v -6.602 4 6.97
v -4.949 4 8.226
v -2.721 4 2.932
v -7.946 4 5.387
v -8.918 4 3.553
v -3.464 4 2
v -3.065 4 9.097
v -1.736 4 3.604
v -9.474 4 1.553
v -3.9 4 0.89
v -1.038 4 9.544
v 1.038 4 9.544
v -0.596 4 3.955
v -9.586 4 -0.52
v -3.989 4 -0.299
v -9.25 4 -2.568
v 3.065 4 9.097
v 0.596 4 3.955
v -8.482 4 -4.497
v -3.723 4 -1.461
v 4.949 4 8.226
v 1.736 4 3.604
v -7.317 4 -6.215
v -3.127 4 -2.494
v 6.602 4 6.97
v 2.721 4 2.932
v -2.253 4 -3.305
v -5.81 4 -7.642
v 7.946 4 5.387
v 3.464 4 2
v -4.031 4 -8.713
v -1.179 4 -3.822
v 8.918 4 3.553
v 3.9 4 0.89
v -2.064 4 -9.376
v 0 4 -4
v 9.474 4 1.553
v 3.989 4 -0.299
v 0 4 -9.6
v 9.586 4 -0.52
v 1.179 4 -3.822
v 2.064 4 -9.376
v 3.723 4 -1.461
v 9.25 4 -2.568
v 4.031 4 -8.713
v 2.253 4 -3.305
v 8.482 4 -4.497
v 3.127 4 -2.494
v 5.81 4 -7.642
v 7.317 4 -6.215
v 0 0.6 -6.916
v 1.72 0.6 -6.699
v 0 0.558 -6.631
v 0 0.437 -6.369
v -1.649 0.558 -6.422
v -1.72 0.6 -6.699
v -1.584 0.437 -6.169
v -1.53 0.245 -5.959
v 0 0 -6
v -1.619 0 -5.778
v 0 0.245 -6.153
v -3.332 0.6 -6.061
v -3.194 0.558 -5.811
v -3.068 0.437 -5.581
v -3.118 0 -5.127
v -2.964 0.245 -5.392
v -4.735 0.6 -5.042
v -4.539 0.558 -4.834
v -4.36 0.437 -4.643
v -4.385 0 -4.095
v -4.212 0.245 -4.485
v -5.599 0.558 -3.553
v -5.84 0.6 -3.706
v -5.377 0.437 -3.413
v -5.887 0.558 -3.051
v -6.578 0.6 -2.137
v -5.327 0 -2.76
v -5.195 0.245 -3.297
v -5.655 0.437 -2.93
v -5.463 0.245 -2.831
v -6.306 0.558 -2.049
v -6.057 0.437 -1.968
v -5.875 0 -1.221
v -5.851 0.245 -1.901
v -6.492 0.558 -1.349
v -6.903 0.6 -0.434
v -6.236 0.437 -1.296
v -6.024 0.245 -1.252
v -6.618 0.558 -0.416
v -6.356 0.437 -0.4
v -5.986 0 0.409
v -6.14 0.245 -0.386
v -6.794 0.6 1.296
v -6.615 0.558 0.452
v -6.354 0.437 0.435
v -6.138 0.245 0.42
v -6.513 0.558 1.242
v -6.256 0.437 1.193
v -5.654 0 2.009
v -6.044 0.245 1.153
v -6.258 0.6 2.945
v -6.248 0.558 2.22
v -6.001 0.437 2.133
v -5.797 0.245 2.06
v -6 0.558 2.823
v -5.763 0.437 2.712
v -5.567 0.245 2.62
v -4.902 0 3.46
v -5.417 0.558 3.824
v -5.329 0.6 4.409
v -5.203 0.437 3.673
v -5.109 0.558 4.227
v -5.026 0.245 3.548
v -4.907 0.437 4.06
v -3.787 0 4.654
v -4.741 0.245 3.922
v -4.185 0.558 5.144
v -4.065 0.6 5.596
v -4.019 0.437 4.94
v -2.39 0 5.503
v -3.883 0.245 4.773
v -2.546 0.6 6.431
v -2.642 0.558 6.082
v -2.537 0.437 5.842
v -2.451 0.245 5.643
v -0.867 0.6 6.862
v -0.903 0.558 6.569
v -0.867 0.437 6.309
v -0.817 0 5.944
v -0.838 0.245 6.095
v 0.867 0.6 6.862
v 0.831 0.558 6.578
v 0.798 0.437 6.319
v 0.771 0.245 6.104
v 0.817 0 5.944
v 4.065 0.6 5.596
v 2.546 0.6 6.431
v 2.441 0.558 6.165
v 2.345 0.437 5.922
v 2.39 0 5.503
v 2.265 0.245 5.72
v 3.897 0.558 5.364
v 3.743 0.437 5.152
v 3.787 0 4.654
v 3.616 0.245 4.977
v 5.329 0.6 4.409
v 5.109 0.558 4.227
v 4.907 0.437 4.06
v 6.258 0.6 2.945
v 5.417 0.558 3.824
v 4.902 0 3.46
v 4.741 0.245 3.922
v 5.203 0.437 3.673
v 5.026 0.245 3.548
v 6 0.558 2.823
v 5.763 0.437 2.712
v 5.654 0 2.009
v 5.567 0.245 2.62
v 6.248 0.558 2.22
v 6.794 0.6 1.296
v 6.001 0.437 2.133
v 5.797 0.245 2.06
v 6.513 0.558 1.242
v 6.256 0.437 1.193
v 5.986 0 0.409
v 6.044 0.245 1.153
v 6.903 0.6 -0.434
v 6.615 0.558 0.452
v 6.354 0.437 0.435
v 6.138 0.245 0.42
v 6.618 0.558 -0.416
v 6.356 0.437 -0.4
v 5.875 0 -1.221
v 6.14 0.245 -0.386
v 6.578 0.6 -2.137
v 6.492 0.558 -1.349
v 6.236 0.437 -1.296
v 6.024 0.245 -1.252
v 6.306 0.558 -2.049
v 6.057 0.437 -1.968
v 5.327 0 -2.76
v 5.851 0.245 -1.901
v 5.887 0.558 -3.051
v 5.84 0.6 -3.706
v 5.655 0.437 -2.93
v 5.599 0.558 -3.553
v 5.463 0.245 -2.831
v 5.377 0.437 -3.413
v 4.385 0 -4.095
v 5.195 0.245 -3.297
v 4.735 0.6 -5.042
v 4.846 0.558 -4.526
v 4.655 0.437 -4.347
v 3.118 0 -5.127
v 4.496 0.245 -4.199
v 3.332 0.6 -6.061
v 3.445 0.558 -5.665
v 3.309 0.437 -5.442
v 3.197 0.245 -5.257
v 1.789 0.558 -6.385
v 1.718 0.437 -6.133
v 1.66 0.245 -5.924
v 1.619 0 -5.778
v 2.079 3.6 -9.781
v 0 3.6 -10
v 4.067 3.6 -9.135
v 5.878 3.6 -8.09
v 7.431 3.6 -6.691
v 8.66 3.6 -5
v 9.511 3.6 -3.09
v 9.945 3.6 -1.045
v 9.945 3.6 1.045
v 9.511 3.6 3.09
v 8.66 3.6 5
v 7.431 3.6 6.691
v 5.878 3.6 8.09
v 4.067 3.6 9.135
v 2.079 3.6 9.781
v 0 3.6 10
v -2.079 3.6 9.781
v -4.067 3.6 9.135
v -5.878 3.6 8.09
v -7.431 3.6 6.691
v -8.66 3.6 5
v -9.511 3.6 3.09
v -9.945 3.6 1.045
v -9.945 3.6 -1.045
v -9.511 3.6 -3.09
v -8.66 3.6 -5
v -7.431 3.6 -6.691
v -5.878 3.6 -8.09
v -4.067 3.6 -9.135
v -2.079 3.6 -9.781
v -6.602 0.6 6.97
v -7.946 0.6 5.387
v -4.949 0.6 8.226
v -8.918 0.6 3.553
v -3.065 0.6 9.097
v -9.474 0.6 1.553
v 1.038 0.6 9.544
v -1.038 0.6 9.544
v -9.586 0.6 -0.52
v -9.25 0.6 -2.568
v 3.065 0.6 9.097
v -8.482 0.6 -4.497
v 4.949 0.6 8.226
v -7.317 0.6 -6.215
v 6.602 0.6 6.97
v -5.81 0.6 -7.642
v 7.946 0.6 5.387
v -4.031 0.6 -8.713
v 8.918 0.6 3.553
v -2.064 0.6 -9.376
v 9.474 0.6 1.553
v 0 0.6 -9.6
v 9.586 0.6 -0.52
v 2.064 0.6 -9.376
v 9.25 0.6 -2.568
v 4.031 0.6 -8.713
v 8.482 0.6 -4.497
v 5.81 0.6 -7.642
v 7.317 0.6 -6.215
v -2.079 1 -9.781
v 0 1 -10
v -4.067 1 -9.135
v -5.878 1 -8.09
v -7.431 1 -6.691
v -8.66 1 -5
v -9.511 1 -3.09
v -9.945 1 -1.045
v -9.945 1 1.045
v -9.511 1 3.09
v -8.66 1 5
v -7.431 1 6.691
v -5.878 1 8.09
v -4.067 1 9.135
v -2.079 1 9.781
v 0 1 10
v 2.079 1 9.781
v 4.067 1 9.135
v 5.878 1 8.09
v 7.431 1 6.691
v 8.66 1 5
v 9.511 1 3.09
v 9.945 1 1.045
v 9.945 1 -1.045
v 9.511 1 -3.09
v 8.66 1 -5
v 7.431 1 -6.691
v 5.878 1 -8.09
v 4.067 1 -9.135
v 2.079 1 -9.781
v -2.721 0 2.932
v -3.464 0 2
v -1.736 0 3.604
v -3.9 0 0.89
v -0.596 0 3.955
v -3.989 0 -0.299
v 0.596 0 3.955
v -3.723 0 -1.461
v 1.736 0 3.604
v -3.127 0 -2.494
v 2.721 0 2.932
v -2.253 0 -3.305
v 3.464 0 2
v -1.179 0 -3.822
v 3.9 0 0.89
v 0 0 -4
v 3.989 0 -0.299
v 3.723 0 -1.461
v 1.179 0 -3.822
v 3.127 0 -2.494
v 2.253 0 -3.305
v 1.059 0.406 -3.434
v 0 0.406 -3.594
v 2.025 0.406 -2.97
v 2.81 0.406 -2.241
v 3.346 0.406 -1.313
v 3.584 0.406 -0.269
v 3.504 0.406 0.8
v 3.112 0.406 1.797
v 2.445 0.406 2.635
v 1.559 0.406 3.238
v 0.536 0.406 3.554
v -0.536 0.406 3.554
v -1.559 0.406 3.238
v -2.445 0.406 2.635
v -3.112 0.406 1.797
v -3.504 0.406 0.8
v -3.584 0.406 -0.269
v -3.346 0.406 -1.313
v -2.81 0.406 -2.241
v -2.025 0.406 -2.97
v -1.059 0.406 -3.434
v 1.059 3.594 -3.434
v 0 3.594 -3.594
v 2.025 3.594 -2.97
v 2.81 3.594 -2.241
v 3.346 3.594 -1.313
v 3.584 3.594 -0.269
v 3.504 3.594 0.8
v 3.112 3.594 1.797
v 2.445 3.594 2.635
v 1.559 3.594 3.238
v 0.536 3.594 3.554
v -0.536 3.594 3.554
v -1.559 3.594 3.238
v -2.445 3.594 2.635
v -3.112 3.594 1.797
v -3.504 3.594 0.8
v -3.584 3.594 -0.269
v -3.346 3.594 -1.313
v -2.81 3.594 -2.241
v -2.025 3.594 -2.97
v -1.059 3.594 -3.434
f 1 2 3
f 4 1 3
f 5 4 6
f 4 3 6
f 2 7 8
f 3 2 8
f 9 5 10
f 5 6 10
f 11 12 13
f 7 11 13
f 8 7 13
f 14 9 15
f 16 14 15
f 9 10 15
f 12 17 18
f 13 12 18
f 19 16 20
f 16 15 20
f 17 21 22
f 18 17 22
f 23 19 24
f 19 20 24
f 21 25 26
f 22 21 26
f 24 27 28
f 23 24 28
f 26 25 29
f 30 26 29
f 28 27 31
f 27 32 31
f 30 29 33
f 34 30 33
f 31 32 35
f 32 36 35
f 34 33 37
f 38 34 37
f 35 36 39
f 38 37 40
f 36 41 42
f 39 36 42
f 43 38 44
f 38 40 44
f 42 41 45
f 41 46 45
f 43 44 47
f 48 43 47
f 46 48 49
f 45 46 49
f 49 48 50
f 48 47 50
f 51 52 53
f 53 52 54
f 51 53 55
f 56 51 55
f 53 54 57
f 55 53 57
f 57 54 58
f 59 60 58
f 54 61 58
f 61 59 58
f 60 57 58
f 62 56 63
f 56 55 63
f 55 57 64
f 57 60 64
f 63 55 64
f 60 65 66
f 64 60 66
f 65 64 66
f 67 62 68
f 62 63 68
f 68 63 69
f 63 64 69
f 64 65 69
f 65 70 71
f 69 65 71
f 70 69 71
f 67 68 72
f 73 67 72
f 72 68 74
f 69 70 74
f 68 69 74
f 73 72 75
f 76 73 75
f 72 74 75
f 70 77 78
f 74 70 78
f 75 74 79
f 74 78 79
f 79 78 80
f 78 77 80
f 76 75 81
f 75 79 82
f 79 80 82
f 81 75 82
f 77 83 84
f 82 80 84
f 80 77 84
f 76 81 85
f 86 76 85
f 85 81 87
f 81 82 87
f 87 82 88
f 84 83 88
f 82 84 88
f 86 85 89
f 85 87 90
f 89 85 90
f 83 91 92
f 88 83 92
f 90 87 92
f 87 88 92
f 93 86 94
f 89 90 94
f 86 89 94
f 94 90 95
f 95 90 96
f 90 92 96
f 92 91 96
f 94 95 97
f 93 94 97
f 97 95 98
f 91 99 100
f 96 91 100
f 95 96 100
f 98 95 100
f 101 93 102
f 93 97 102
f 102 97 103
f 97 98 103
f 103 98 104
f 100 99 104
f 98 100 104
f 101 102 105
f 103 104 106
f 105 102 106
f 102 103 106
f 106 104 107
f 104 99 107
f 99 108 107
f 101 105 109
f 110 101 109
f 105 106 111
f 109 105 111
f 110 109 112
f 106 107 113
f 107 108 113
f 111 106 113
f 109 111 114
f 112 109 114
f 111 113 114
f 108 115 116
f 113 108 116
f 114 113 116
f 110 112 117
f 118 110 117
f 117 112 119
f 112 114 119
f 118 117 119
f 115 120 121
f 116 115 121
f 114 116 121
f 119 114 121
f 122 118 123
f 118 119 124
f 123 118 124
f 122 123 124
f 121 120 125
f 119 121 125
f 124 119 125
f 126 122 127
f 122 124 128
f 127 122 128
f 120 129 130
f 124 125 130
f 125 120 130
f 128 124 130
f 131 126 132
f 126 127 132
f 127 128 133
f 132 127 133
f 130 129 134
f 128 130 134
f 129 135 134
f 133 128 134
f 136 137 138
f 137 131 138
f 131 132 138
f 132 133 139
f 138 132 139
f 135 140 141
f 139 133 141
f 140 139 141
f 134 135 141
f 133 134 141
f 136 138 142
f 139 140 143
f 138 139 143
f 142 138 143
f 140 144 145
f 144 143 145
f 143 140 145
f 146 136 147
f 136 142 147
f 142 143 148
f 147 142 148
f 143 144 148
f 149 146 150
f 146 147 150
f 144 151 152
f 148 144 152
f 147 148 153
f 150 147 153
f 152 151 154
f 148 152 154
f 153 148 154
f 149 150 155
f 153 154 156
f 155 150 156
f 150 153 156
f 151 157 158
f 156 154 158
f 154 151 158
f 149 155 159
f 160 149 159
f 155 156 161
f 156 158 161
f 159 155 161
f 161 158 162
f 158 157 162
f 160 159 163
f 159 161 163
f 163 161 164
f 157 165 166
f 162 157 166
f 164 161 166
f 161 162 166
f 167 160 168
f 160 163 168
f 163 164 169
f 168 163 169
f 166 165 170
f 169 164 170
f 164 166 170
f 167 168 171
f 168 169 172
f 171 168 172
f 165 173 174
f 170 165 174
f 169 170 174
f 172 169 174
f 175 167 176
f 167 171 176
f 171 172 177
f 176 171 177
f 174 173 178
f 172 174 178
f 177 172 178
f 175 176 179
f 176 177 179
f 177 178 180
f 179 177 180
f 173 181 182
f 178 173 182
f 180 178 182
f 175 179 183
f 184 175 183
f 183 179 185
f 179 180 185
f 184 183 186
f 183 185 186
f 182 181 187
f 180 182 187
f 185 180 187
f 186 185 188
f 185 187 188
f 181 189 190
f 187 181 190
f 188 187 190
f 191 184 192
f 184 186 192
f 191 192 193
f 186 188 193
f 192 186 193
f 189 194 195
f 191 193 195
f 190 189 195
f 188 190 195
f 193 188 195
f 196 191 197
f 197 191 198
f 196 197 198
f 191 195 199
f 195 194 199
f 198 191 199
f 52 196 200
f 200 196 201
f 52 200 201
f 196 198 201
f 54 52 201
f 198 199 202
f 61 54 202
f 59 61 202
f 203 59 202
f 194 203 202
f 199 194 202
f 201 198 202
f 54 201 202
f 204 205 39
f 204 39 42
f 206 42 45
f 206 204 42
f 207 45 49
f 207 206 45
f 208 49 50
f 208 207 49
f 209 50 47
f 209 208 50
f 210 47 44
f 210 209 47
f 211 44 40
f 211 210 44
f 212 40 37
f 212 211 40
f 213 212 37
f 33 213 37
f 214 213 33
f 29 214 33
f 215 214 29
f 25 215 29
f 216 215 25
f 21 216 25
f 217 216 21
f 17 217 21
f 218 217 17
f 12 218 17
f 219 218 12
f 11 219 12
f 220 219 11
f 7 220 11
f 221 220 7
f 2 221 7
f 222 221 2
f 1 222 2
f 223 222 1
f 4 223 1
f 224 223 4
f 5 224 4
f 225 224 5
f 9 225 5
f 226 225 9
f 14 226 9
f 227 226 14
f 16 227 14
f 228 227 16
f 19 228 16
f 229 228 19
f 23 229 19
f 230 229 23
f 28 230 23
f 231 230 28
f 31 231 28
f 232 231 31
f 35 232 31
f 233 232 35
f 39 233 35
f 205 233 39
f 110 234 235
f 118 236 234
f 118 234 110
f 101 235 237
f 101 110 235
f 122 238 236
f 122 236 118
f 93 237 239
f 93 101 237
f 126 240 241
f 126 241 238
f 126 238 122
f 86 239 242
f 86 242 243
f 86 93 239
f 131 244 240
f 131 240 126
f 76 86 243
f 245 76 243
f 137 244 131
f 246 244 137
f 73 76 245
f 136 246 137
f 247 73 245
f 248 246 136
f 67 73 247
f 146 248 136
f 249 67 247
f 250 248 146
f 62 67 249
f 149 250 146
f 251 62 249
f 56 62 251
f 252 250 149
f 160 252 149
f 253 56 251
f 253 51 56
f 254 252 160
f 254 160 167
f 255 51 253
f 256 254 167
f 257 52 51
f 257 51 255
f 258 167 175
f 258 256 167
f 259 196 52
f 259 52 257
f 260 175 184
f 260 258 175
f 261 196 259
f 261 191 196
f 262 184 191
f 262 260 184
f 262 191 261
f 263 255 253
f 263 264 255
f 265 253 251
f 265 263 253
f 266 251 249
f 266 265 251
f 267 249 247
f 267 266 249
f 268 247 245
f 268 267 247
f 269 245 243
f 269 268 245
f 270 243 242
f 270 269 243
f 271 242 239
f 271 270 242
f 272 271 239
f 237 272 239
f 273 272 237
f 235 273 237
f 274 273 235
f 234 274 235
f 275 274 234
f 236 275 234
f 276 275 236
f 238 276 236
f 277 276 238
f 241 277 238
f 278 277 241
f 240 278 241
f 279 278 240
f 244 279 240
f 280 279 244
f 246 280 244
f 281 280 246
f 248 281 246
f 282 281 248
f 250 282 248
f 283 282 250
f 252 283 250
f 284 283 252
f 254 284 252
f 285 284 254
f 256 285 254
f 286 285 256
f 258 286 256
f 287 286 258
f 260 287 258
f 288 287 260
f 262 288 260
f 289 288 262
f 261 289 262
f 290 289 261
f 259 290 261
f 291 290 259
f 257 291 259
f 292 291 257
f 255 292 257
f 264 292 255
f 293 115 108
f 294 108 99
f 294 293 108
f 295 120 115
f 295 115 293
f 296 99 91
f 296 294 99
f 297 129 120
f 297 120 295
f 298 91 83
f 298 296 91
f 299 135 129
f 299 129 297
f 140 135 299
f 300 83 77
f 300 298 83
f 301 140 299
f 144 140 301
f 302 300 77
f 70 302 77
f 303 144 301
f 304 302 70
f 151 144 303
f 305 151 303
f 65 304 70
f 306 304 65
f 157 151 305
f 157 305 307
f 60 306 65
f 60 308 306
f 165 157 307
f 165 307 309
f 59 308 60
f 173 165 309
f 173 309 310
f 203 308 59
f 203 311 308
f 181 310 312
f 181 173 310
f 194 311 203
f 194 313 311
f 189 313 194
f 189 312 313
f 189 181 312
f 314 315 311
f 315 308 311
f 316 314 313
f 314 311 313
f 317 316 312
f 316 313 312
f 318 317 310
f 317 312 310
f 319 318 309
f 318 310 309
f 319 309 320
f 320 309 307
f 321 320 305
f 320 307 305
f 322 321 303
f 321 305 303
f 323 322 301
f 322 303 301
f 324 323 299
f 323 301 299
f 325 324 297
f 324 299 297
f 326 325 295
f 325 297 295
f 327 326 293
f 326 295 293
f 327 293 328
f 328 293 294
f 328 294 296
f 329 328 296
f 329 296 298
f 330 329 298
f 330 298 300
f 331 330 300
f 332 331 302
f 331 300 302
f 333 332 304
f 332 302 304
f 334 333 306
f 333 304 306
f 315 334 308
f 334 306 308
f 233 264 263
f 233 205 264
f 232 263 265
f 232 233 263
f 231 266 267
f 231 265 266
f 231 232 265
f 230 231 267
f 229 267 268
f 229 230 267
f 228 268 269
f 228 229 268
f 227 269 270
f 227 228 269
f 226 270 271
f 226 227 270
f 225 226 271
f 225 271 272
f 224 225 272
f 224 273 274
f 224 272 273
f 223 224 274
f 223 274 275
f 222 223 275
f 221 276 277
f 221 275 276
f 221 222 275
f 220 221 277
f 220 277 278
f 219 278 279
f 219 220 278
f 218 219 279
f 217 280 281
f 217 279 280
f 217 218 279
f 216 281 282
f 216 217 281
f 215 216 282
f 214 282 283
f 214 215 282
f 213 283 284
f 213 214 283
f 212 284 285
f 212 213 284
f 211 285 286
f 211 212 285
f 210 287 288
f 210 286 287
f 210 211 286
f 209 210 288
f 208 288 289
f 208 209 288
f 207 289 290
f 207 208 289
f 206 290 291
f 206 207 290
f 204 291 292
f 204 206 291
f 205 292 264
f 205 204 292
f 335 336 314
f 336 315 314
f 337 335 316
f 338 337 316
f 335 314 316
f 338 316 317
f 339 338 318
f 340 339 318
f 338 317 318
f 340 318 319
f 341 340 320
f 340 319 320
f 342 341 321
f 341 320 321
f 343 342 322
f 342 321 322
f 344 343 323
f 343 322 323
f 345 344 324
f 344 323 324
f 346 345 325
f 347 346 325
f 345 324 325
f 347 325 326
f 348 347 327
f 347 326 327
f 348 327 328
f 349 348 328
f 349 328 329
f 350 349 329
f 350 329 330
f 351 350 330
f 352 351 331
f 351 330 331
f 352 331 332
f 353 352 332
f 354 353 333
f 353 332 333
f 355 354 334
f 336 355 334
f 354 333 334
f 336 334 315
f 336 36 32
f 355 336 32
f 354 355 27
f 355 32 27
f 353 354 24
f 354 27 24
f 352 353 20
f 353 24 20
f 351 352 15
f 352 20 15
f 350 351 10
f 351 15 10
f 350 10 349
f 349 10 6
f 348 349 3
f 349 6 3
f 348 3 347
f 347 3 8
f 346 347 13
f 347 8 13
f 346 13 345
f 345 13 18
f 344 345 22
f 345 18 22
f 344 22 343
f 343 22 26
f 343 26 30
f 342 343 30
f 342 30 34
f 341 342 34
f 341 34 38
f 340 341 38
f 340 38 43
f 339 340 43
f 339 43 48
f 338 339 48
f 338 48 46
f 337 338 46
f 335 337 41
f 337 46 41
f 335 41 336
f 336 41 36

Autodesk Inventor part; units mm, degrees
sketch "Sketch_1" plane through (0, 0, 0) normal (1, 0, 0) x (0, 1, 0)
  line L0 (0, 0) -> (4, 0)
  line L1 (0.406, -3.594) -> (0, -4)
  line L2 (0, -4) -> (0, -6)
  arc A0 (0.6, -6.9165) -> (0, -6) centre (-0.4, -6.9165) ccw
  line L3 (0.6, -6.9165) -> (0.6, -9.6)
  line L4 (0.6, -9.6) -> (1, -10)
  line L5 (1, -10) -> (3.6, -10)
  line L6 (3.6, -10) -> (4, -9.6)
  line L7 (4, -9.6) -> (4, -4)
  line L8 (4, -4) -> (3.594, -3.594)
  line L9 (3.594, -3.594) -> (0.406, -3.594)
revolve "Revolution1" add sketch "Sketch_1" angle 360 about axis through (0, 0, 0) along (0, -1, 0)
thread "Thread1" size "M8x0.75" class "6H" standard "ISO Metric profile" full length
ref_plane "ANBAU_XY" through (0, 0, 0) normal (0, 1, 0) x (1, 0, 0)
ref_plane "ANBAU_YZ" through (0, 0, 0) normal (1, 0, 0) x (0, 0, -1)
ref_plane "ANBAU_ZX" through (0, 0, 0) normal (0, 0, -1) x (0, 1, 0)
properties part number "209407 M8X0,75"
